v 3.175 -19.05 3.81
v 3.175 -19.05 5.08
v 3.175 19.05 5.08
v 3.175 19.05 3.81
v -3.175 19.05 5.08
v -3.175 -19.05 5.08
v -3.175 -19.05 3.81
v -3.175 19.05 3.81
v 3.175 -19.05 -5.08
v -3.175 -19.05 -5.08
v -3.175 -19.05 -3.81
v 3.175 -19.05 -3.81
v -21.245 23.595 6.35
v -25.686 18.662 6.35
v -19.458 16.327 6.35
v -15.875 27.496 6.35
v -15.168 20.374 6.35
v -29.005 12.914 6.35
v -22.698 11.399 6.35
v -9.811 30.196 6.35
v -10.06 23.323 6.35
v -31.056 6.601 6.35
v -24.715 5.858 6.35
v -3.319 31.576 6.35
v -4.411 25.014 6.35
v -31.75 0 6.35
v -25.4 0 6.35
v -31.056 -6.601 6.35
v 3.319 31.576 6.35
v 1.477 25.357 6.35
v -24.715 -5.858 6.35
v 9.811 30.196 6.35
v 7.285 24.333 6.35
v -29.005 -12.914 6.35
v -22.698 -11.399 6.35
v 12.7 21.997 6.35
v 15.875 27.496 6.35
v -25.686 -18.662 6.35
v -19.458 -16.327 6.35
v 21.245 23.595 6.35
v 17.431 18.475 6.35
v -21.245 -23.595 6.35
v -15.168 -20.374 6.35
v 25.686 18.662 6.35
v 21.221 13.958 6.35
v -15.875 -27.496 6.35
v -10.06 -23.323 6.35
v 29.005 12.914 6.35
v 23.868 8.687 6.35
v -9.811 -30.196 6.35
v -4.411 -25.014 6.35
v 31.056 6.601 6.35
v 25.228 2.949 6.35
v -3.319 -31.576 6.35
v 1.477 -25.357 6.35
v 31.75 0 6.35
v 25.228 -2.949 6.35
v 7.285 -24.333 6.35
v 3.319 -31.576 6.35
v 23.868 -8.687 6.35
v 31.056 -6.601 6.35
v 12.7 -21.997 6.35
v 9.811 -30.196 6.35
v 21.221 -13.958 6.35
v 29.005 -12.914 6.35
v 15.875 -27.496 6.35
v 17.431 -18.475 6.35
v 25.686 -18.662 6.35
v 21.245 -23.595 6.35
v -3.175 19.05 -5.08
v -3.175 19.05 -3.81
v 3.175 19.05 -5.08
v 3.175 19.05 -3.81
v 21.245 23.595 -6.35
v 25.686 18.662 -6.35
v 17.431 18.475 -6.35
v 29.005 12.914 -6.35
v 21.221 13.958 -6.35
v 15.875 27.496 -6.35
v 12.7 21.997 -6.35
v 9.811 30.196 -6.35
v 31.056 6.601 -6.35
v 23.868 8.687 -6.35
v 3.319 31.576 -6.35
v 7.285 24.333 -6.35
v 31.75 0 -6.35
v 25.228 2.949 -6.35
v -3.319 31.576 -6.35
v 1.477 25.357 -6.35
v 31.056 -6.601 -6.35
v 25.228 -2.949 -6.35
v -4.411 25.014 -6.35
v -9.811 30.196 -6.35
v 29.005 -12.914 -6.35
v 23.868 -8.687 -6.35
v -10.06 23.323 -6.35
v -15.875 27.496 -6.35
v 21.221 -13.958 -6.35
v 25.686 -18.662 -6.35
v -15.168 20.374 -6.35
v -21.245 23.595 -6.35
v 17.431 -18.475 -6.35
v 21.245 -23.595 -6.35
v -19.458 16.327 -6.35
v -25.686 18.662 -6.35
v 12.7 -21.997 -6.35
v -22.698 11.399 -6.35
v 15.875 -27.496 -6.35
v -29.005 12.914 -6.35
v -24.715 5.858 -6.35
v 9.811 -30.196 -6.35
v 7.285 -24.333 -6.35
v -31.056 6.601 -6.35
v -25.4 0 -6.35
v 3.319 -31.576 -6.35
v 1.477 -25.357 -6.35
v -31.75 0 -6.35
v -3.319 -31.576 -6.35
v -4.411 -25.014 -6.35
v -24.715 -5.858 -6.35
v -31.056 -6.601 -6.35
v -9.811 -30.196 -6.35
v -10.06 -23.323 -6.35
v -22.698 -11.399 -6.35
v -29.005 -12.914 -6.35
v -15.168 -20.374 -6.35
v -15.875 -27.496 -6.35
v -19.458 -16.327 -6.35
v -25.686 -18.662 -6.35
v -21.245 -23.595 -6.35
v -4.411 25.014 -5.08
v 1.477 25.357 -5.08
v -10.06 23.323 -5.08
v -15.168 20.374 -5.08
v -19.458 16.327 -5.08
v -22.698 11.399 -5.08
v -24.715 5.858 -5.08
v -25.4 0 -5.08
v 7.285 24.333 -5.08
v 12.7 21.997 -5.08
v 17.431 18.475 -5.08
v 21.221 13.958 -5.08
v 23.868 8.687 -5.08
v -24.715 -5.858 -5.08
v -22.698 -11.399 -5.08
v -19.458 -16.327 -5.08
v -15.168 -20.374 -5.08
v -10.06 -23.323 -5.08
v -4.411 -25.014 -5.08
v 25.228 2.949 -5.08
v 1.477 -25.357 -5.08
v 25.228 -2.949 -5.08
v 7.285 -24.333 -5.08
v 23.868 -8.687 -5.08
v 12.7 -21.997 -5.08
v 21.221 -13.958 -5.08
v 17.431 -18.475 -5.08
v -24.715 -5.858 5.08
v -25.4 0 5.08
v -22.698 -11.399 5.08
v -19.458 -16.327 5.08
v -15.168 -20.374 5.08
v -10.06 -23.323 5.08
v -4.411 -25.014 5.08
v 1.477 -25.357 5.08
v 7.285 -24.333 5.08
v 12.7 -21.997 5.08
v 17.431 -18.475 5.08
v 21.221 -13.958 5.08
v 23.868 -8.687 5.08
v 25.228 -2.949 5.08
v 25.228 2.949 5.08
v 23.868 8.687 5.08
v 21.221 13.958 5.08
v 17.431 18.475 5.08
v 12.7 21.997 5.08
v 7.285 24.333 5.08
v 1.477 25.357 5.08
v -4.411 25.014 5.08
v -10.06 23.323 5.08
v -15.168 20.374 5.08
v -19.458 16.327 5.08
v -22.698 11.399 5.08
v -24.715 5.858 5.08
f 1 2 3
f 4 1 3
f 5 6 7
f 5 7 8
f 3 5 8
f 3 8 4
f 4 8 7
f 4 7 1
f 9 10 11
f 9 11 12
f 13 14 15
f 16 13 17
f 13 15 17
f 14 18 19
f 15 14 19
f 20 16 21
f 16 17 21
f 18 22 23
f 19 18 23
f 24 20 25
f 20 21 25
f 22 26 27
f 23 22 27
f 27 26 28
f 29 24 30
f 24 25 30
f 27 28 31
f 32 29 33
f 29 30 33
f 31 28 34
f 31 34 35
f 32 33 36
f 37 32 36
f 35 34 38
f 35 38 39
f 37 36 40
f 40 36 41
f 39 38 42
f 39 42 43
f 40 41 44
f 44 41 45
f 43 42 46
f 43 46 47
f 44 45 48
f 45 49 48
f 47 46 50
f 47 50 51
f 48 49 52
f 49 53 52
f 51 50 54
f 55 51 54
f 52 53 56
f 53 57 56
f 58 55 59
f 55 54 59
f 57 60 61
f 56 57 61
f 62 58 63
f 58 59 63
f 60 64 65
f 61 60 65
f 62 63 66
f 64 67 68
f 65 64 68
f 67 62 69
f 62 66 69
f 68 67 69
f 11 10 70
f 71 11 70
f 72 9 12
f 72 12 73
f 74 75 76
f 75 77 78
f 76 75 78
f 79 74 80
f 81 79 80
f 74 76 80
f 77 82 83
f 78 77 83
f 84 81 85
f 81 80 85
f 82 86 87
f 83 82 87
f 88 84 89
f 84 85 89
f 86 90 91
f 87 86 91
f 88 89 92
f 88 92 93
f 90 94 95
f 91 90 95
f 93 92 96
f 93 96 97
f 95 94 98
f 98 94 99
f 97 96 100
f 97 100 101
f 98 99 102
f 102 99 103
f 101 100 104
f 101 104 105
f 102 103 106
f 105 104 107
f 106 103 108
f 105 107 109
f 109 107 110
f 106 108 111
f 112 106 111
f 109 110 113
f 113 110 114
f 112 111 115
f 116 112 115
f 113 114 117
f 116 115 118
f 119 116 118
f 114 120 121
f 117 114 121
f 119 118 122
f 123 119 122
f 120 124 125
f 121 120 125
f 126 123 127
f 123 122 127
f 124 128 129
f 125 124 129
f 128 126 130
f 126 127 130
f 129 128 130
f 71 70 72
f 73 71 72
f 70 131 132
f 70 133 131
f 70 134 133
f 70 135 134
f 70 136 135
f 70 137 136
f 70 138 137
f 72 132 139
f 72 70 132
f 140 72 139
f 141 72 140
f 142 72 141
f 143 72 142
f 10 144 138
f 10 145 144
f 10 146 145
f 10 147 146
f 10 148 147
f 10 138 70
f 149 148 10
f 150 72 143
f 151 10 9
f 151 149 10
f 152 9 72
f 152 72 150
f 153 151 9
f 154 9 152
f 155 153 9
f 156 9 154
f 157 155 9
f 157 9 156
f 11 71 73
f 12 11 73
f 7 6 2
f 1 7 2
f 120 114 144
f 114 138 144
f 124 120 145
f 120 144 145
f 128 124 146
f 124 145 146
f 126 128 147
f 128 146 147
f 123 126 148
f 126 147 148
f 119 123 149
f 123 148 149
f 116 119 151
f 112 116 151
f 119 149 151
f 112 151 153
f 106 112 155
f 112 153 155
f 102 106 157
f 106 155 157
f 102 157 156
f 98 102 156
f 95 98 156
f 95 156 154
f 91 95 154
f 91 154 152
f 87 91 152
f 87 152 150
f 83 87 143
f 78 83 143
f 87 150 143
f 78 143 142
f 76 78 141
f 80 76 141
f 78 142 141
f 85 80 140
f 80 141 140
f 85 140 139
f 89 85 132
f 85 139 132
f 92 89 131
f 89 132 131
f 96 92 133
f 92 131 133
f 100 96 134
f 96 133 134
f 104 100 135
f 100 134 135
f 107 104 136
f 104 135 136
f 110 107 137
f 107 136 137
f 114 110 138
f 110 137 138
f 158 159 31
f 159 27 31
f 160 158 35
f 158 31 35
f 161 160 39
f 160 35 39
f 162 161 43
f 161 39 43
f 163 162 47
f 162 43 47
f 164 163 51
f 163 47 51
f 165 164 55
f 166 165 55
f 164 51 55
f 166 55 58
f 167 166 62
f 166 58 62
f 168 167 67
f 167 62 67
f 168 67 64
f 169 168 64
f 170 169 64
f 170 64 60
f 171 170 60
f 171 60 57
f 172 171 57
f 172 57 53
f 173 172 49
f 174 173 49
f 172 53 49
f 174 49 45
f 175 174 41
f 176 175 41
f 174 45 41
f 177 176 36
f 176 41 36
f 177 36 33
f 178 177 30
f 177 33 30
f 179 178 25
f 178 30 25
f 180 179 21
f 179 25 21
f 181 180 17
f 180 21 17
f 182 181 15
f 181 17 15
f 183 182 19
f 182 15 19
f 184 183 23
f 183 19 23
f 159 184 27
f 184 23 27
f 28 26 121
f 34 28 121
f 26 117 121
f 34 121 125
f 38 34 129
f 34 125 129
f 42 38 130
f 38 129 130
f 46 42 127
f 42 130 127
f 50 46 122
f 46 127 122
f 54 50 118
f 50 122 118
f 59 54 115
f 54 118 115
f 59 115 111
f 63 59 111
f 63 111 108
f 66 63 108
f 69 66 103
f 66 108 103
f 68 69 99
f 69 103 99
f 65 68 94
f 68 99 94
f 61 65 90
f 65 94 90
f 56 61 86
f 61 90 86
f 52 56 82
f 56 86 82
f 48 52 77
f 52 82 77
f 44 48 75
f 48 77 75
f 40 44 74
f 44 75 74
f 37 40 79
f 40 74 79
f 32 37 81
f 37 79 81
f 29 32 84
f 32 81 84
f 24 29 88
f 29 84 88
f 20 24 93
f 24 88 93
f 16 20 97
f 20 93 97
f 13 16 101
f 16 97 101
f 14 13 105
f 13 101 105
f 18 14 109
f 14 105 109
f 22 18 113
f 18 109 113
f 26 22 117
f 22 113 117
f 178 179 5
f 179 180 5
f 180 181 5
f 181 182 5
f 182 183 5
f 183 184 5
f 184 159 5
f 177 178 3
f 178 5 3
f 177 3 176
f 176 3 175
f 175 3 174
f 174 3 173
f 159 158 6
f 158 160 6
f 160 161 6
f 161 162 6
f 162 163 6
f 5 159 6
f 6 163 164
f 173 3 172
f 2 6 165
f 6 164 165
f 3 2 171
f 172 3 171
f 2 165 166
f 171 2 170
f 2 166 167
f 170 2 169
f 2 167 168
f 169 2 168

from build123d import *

# Parameters (mm, degrees)
SKETCH2_W          = 25.4
SKETCH2_H          = 10.16
SKETCH3_W          = 6.35
SKETCH3_H          = 38.1
CUT_EXTRUDE1_DEPTH = 1.27


with BuildPart() as part:
    # Sketch2 → Revolve1 (revolve)
    with BuildSketch(Plane(origin=(0, 0, 0), x_dir=(1, 0, 0), z_dir=(0, 1, 0)), mode=Mode.PRIVATE) as revolve1_sk:
        with Locations((12.7, 0)):
            Rectangle(SKETCH2_W, SKETCH2_H)
        Polygon((25.4, 5.08), (25.4, -5.08), (25.4, -6.35), (31.75, -6.35), (31.75, 6.35), (25.4, 6.35), align=None)
    revolve(revolve1_sk.sketch.rotate(Axis((0, 0, -88.99), (0, 0, 1)), 180), axis=Axis((0, 0, -88.99), (0, 0, 1)))

    # Sketch3 → Cut-Extrude1 (cut)
    with BuildSketch(Plane.XY.offset(5.08)):
        Rectangle(SKETCH3_W, SKETCH3_H)
    cut_extrude1 = extrude(amount=-CUT_EXTRUDE1_DEPTH, mode=Mode.SUBTRACT)

    # Mirror1: Cut-Extrude1 across plane
    add(cut_extrude1.mirror(Plane.XY), mode=Mode.SUBTRACT)


solid = part.part
